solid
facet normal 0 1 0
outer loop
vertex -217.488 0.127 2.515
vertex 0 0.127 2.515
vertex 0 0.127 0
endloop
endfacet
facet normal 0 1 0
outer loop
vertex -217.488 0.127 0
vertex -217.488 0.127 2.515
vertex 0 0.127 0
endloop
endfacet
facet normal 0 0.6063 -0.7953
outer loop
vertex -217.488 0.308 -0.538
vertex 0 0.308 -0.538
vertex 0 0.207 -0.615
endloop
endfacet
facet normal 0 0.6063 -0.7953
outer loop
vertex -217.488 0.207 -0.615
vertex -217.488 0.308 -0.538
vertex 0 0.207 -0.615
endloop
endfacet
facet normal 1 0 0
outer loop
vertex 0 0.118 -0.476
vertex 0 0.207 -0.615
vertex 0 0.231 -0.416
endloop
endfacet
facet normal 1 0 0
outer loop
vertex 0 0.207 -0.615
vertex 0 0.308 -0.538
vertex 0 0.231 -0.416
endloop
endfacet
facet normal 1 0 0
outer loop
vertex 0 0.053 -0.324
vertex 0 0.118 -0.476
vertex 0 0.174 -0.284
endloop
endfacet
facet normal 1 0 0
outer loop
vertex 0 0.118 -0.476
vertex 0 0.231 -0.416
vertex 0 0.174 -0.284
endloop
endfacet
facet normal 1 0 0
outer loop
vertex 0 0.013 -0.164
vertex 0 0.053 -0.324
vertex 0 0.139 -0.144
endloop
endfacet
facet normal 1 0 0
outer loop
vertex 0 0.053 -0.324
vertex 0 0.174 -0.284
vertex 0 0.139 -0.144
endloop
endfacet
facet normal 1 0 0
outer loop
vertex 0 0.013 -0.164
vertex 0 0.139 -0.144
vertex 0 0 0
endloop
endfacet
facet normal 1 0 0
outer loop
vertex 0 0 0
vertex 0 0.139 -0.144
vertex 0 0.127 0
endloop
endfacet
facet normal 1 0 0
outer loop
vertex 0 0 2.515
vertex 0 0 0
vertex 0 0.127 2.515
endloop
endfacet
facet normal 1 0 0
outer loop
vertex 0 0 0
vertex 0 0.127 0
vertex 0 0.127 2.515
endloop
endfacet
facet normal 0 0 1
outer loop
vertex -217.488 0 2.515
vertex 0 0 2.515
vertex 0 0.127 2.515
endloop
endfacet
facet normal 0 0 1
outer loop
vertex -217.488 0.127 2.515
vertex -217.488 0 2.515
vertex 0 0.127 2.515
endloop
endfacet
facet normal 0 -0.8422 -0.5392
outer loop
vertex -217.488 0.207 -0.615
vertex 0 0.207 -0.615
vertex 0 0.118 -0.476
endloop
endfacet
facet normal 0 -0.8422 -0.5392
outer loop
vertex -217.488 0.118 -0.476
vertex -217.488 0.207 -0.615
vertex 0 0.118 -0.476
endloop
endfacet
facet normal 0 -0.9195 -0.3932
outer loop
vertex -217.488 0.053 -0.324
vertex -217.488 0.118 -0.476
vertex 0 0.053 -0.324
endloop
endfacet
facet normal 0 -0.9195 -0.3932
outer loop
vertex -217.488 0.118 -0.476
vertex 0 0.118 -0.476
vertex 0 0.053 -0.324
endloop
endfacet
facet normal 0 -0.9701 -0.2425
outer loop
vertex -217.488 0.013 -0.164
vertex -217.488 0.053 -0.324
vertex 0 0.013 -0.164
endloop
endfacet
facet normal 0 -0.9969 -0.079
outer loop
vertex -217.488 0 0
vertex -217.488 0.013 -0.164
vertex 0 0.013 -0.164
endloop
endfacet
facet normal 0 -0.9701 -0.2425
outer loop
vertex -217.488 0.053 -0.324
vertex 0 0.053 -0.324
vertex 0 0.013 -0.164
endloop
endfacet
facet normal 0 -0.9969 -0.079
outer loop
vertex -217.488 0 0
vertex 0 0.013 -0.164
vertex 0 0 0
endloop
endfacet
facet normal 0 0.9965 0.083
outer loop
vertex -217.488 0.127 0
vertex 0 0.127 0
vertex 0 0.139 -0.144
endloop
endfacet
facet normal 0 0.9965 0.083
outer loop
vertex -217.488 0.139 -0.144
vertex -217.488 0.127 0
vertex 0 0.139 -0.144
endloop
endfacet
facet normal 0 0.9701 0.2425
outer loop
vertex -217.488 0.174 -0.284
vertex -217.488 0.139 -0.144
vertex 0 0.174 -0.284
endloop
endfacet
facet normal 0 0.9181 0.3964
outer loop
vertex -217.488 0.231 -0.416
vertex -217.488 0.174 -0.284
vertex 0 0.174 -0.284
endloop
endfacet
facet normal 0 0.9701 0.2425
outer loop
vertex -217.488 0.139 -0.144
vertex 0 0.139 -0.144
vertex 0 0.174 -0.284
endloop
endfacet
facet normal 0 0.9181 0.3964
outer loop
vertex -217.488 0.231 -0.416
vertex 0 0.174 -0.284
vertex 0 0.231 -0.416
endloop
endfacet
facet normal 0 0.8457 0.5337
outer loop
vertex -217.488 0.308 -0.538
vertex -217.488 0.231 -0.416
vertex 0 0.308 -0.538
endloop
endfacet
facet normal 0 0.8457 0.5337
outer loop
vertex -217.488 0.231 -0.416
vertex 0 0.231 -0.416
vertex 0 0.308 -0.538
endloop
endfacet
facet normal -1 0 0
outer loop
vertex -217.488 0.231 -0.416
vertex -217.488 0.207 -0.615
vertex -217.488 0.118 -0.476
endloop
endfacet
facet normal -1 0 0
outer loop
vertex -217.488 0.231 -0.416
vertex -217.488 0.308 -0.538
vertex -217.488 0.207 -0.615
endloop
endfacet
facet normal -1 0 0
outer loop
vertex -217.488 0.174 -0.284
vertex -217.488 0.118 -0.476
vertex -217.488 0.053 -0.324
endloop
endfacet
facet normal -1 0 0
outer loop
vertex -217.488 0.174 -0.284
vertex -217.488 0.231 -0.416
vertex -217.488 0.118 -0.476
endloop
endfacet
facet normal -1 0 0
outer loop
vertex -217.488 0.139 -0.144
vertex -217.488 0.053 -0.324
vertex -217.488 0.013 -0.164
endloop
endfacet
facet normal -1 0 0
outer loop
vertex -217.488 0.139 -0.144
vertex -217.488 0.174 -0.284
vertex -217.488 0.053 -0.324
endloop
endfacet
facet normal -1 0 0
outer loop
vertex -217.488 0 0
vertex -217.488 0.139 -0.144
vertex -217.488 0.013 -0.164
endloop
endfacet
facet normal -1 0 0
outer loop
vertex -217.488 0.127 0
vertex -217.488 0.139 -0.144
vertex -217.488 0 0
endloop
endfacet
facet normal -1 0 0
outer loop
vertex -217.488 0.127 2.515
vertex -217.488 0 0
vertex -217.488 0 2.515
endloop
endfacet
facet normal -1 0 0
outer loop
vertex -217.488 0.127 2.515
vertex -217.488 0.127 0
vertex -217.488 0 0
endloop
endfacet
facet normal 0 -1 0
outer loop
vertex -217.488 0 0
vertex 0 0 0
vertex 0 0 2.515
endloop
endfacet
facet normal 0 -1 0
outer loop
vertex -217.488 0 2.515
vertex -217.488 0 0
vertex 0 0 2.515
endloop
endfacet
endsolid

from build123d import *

# Parameters (mm, degrees)
EXTRUDE_THIN1_DEPTH = 217.4875


with BuildPart() as part:
    # Sketch1 → Extrude-Thin1 (new body)
    with BuildSketch(Plane(origin=(0, 0, 0), x_dir=(0, 0, -1), z_dir=(1, 0, 0))):
        with BuildLine():
            ThreePointArc((0.614869388, 0.207178861), (0.324417726, 0.053186862), (0, 0))
            Line((0, 0), (-2.5146, 0))
            Line((-2.5146, 0), (-2.5146, 0.127))
            Line((-2.5146, 0.127), (0, 0.127))
            ThreePointArc((0, 0.127), (0.283865511, 0.173538504), (0.538010715, 0.308281503))
            Line((0.538010715, 0.308281503), (0.614869388, 0.207178861))
        make_face()
    extrude(amount=-EXTRUDE_THIN1_DEPTH)


solid = part.part
